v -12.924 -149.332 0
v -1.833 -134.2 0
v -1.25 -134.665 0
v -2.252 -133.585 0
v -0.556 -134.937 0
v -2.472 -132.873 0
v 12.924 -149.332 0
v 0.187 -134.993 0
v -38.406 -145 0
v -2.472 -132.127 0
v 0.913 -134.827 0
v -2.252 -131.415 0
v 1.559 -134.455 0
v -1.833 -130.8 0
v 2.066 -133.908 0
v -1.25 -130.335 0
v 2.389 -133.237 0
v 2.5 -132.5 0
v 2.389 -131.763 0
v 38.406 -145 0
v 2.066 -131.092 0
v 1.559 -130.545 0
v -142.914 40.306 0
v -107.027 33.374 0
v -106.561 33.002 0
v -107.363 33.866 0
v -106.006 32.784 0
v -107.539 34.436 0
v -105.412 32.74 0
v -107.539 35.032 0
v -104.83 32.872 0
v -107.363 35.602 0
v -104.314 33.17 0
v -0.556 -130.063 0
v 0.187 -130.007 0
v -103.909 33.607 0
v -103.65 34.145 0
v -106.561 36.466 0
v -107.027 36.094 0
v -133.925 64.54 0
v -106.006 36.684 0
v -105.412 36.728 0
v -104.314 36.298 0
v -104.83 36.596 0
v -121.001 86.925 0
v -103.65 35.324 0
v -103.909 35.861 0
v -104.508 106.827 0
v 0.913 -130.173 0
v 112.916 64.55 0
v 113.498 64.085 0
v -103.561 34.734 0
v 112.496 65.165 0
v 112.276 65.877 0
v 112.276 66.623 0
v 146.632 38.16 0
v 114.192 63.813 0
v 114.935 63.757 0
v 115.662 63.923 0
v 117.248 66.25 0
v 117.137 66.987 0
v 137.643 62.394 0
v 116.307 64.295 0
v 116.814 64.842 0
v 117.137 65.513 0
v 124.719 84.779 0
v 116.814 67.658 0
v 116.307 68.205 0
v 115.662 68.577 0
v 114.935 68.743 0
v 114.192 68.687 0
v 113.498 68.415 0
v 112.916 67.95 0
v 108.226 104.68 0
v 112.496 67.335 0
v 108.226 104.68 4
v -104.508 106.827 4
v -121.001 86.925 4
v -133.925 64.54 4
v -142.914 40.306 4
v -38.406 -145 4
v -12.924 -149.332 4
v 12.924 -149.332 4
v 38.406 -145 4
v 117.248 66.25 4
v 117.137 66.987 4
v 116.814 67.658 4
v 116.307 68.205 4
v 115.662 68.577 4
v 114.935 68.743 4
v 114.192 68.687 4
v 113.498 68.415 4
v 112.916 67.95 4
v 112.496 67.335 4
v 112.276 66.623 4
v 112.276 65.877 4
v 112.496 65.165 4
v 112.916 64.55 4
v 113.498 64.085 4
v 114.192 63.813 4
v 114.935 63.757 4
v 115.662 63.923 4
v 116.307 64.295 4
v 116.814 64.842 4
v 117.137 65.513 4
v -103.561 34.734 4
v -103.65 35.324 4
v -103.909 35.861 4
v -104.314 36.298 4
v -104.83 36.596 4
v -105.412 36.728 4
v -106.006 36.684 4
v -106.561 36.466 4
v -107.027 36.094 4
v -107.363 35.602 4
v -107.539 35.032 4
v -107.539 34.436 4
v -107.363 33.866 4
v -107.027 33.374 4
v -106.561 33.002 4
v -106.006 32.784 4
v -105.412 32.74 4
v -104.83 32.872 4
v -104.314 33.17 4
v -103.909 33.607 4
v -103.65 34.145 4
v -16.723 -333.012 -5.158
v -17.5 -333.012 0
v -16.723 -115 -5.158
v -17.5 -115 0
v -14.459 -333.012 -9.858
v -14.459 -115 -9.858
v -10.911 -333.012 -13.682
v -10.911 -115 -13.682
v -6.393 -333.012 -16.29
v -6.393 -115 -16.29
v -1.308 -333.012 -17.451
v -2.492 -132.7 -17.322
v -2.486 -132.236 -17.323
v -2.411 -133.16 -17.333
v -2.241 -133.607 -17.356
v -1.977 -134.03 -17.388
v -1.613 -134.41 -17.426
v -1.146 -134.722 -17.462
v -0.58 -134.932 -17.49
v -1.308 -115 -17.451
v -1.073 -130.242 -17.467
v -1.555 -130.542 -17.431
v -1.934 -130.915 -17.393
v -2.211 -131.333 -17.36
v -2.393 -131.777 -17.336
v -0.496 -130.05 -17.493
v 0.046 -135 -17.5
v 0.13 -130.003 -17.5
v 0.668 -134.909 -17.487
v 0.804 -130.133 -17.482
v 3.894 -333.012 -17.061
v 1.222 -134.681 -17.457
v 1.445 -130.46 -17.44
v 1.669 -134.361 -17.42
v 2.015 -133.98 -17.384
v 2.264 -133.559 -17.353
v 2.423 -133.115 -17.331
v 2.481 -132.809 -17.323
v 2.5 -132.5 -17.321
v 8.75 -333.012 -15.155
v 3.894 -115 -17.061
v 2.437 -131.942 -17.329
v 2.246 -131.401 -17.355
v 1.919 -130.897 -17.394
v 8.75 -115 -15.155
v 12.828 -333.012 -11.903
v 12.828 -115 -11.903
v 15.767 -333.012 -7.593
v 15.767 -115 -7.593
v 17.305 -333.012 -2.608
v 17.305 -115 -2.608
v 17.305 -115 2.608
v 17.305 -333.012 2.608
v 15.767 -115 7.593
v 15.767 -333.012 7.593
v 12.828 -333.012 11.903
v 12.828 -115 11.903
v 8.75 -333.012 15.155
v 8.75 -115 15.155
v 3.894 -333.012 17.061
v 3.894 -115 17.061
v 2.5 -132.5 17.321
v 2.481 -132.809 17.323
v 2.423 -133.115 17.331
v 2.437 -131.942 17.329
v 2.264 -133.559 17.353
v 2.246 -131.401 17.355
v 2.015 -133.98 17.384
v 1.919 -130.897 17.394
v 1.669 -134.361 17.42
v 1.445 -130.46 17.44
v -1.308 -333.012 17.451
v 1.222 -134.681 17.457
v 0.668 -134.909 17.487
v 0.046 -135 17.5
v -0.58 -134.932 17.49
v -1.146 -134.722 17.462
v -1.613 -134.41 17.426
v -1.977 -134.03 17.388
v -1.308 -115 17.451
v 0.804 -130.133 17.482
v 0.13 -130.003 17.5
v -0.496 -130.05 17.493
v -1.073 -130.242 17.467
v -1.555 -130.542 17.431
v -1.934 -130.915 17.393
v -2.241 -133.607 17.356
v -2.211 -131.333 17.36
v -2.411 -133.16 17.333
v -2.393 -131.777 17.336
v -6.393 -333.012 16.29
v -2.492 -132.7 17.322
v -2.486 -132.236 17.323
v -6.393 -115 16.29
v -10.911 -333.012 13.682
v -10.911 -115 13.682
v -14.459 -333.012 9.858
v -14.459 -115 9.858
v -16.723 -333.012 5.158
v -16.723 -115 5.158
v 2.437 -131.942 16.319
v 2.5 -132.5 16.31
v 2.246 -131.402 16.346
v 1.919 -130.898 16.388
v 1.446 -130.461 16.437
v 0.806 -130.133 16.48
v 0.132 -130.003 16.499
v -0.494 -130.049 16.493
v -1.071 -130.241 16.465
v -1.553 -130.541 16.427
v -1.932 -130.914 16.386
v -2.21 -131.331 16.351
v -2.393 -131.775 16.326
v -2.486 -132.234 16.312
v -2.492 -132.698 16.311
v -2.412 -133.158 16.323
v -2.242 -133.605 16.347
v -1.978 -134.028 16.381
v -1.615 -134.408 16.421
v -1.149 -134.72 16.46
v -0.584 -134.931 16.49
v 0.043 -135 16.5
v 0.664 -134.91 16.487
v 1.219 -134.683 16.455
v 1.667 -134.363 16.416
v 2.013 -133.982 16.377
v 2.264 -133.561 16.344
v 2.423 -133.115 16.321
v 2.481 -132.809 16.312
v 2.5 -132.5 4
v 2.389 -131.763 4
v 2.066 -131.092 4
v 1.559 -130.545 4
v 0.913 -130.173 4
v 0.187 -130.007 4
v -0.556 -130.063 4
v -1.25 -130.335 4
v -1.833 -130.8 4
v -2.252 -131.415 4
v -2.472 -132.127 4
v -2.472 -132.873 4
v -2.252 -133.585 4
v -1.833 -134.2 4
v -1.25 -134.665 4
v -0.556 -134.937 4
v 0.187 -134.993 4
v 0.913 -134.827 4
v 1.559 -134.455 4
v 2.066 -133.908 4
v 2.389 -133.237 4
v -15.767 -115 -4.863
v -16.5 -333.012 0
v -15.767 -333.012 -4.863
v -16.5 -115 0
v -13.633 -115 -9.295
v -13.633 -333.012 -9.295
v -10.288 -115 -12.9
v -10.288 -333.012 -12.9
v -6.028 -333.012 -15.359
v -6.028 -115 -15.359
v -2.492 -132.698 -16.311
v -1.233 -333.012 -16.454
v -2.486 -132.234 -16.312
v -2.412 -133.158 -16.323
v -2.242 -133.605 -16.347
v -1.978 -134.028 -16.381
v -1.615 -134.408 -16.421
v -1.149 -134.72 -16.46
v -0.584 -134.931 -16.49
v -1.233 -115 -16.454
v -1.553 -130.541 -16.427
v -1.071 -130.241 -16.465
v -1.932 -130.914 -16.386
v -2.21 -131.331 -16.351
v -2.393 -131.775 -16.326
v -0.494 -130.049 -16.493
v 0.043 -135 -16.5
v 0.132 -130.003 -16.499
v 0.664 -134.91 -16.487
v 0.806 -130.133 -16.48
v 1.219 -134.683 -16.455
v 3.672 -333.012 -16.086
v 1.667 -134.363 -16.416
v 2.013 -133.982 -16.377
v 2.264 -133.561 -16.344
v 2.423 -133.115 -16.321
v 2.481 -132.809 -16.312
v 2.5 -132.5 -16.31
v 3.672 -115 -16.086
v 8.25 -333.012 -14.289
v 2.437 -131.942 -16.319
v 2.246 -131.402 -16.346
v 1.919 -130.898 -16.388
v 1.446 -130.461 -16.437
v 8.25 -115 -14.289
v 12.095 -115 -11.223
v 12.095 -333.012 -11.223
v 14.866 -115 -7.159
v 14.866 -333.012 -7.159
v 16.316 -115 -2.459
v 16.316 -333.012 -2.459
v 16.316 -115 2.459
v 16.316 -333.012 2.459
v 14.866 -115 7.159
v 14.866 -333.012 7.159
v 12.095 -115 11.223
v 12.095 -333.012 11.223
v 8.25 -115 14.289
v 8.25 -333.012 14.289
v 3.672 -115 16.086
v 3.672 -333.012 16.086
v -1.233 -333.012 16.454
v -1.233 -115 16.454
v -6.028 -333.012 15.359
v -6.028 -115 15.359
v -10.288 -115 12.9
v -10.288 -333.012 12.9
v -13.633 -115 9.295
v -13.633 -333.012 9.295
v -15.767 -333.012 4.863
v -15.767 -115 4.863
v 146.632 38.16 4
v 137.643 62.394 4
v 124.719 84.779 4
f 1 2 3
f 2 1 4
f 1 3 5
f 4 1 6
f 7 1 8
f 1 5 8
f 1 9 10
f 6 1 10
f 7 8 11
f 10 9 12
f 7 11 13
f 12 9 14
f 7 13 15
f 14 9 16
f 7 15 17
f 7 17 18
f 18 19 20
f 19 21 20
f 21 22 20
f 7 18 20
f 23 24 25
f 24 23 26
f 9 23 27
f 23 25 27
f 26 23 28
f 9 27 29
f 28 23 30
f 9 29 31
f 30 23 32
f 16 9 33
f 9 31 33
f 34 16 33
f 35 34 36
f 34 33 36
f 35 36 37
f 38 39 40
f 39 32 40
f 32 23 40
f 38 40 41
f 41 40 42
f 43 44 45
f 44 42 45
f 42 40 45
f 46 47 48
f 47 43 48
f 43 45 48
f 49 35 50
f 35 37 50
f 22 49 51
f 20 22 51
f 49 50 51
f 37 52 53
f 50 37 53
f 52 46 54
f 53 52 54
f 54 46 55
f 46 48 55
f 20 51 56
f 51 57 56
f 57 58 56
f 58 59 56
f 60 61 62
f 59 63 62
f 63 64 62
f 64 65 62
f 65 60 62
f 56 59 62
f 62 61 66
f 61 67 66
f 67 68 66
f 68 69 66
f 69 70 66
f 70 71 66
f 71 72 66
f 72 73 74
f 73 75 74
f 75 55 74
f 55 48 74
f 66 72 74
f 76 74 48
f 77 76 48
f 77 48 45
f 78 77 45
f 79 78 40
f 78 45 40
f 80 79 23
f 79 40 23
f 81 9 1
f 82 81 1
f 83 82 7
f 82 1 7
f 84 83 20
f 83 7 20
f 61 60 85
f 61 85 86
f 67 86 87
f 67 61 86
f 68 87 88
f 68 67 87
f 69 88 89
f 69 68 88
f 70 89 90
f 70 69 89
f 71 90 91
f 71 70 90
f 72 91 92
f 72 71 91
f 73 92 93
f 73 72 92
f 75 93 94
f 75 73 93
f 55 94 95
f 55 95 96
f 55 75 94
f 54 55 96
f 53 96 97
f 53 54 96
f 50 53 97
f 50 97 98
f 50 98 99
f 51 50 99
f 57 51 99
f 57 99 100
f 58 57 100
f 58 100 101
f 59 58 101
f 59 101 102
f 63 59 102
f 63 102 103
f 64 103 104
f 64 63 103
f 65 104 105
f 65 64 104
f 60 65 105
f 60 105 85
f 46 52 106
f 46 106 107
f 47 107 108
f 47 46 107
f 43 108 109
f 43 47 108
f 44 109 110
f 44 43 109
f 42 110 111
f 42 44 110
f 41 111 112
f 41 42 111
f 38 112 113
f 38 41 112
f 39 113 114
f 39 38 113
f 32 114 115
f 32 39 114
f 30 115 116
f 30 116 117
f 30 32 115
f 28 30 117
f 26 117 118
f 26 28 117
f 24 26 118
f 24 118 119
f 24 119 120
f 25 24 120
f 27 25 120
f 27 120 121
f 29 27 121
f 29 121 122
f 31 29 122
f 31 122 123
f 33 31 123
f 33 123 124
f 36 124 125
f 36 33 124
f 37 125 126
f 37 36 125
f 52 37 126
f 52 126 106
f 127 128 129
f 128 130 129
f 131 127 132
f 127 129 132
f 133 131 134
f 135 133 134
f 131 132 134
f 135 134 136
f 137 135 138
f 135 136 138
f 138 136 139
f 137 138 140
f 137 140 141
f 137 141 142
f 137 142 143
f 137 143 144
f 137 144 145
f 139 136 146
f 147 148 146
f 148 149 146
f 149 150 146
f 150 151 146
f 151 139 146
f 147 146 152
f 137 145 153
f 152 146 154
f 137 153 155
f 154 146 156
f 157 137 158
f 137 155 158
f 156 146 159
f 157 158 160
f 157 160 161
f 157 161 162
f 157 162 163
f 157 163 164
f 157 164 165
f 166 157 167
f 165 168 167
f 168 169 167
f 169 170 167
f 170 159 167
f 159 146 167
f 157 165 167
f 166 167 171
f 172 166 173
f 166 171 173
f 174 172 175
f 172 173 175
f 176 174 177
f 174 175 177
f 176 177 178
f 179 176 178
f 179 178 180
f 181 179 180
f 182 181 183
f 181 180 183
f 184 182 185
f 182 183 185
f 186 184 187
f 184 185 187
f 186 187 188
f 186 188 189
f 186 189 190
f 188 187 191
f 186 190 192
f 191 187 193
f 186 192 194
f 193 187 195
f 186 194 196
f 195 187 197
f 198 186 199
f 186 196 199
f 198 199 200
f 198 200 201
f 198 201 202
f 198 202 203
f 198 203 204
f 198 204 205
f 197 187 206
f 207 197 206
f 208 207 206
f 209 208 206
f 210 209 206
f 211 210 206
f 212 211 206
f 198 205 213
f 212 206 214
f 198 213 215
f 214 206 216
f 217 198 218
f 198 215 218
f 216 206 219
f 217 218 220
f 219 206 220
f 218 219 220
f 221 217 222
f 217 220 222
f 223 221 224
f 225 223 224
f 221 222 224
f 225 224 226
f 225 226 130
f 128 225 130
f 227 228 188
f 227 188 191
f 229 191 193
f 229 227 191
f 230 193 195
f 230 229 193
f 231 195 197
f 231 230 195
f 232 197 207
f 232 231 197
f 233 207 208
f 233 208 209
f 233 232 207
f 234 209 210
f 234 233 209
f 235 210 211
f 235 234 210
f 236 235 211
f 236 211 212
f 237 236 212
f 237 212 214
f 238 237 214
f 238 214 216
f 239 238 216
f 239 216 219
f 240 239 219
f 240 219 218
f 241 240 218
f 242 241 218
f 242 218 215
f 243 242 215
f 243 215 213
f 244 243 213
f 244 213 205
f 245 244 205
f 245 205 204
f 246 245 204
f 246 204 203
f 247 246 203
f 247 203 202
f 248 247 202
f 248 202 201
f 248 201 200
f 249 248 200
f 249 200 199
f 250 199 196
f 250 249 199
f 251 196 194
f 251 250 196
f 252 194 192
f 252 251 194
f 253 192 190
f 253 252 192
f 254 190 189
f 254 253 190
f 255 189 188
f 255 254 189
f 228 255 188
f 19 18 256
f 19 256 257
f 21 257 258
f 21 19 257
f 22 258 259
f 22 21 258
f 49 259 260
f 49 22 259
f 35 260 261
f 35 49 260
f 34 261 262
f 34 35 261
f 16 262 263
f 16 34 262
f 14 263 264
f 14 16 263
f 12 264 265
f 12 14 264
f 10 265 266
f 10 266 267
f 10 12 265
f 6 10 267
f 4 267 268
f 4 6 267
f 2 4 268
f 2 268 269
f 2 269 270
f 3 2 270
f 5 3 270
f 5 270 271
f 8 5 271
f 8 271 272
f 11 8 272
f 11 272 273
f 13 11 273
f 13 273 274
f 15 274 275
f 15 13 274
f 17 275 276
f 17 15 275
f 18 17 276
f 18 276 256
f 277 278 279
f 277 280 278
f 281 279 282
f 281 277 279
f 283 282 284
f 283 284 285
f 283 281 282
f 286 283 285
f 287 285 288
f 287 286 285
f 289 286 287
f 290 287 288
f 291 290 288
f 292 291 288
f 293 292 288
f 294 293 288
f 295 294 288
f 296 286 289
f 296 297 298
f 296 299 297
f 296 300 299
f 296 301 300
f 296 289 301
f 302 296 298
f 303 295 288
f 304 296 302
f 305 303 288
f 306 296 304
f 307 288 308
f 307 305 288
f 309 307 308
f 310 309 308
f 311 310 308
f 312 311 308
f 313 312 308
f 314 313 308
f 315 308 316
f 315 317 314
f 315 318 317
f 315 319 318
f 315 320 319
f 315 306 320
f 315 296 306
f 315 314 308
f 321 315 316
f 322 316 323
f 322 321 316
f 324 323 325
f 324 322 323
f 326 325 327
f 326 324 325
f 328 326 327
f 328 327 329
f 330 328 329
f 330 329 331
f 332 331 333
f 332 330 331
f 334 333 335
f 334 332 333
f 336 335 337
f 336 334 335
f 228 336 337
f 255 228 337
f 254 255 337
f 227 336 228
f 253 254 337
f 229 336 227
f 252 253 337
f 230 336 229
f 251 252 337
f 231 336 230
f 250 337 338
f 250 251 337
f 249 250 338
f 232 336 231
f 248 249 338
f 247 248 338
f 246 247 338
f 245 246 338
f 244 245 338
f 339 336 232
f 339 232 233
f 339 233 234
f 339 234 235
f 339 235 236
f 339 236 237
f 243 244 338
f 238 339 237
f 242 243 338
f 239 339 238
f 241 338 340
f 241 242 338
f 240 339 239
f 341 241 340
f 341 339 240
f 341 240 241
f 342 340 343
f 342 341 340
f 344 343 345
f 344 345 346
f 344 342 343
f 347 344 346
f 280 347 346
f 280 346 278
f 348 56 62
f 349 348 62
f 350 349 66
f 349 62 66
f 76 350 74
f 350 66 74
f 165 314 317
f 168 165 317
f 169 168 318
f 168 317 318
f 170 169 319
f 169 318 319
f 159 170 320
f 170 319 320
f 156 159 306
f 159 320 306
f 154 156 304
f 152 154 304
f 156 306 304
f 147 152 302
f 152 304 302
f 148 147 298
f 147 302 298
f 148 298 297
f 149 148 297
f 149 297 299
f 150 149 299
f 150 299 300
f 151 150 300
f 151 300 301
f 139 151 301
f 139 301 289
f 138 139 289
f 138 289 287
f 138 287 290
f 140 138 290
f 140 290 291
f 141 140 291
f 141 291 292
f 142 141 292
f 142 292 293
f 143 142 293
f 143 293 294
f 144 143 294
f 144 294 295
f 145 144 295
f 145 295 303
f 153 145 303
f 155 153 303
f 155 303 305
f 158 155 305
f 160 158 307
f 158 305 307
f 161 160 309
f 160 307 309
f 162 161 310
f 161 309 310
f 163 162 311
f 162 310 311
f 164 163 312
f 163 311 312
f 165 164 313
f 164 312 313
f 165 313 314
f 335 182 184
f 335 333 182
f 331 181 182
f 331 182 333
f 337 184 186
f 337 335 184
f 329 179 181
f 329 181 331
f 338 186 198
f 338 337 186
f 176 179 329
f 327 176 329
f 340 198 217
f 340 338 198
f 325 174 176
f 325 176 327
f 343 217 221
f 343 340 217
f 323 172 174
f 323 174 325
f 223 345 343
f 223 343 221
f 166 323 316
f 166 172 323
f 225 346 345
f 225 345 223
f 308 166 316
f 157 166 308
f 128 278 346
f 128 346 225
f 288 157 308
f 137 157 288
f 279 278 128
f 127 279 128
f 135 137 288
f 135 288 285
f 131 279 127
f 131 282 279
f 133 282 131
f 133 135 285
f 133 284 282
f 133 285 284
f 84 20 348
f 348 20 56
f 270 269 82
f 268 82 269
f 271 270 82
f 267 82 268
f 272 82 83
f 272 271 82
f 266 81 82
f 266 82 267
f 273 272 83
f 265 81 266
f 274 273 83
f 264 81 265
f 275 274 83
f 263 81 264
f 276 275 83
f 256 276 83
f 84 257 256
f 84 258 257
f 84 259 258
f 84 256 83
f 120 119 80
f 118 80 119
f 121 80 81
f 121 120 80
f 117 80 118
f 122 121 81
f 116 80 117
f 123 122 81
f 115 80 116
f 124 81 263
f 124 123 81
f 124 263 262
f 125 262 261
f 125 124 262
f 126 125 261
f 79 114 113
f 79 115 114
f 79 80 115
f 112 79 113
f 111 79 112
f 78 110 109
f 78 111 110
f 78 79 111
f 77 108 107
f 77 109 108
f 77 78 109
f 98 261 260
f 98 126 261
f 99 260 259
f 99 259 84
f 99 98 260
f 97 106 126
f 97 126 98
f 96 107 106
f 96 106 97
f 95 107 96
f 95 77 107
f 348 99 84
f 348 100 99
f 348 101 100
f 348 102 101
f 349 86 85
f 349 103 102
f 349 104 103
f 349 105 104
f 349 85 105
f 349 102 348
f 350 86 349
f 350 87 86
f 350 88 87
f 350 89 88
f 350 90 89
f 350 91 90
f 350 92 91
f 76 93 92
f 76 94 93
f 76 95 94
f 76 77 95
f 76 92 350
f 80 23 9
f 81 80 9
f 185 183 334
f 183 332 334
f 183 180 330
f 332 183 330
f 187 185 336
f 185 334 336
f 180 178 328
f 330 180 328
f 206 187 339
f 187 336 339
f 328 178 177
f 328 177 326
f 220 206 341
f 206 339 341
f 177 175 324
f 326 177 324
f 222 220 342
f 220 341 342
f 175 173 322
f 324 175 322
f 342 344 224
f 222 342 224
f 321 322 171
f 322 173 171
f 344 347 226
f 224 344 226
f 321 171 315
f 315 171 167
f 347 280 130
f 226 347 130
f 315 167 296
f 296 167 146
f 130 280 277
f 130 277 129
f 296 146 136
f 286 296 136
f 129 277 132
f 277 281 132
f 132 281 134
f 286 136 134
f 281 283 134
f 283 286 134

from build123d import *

# Parameters (mm, degrees)
F1_W          = 1
F1_H          = 218.012
F3_R          = 2.5
F3_R_2        = 2
F4_DEPTH      = 4
F5_DEPTH      = 17.501
F5_DEPTH_BACK = 17.501


with BuildPart() as f2:
    # F1 (on Top) → F2 (revolve)
    with BuildSketch(Plane.XY):
        with Locations((-17, -224.006)):
            Rectangle(F1_W, F1_H)
    revolve(axis=Axis((0, -182.075, 0), (0, -1, 0)))

    # F3 (on Top) → F5 (cut, two sides)
    with BuildSketch(Plane.XY) as f5_sk:
        with Locations((0, -132.5)):
            Circle(F3_R)
    extrude(amount=-F5_DEPTH, mode=Mode.SUBTRACT)
    extrude(f5_sk.sketch, amount=F5_DEPTH_BACK, mode=Mode.SUBTRACT)


with BuildPart() as f4:
    # F3 (on Top) → F4 (new body)
    with BuildSketch(Plane.XY):
        with BuildLine():
            Line((-142.9136854684, 40.3062231548), (-38.4057287393, -145))
            ThreePointArc((-38.4057287393, -145), (0, -149.8768585191), (38.4057287393, -145))
            Line((38.4057287393, -145), (146.6316471062, 38.1596570024))
            ThreePointArc((146.6316471062, 38.1596570024), (131.6522661047, 73.858423001), (108.2259183669, 104.6803304806))
            Line((108.2259183669, 104.6803304806), (-104.5079567291, 106.826896633))
            ThreePointArc((-104.5079567291, 106.826896633), (-127.9343044669, 76.0049891534), (-142.9136854684, 40.3062231548))
        make_face()
        with Locations((0, -132.5)):
            Circle(F3_R, mode=Mode.SUBTRACT)
        with Locations((-105.5611399155, 34.734050325)):
            Circle(F3_R_2, mode=Mode.SUBTRACT)
        with Locations((114.7483660014, 66.25)):
            Circle(F3_R, mode=Mode.SUBTRACT)
    extrude(amount=F4_DEPTH)


solid = Compound([f2.part, f4.part])
